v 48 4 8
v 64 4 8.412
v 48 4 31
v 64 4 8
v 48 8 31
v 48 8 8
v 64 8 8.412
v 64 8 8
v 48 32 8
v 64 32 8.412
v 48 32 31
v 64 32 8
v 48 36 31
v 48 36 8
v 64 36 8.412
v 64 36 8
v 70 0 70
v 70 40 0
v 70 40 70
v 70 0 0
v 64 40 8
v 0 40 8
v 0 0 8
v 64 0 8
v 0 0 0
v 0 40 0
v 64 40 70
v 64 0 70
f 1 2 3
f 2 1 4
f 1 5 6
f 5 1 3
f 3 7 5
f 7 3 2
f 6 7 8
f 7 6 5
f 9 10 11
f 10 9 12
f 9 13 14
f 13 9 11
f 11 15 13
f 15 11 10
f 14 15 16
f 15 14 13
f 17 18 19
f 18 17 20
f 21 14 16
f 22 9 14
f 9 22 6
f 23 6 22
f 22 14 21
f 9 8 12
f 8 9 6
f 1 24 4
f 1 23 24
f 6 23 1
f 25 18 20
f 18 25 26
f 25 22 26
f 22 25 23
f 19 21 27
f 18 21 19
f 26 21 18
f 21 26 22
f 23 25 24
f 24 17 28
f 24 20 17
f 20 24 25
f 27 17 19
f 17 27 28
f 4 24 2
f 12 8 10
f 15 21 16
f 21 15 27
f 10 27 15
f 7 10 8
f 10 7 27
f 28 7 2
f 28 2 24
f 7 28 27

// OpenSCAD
$fn = 32;

// ----------------------------------------------------------------------
// Rib bracket: 2-gusset L bracket
// ----------------------------------------------------------------------

// --- parameters (mm) ---
base_l = 70;              // foot length, X
base_w = 40;              // foot width, Y
base_t = 8;               // foot thickness
plate_t = 6;              // upright plate thickness
plate_h = 70;             // overall height
gus_l = 16;               // gusset leg along the foot
gus_h = 24;               // gusset height
gus_t = 4;                // gusset thickness
gus_edge = 4;             // gusset margin from the foot edge
n_gus = 2;                // gusset count

gus_pitch = (base_w - 2 * gus_edge - gus_t) / (n_gus - 1);  // gusset pitch

union() {
  cube([base_l, base_w, base_t]);
  translate([base_l - plate_t, 0, base_t - 1])
    cube([plate_t, base_w, plate_h - base_t + 1]);
  for (i = [0 : n_gus - 1])
    translate([base_l - plate_t - gus_l, gus_edge + i * gus_pitch, base_t - 1])
      rotate([-90, 0, 0])
        linear_extrude(height = gus_t)
          polygon(points = [[0, 0], [gus_l + 1, 0], [0, -gus_h]]);
}
